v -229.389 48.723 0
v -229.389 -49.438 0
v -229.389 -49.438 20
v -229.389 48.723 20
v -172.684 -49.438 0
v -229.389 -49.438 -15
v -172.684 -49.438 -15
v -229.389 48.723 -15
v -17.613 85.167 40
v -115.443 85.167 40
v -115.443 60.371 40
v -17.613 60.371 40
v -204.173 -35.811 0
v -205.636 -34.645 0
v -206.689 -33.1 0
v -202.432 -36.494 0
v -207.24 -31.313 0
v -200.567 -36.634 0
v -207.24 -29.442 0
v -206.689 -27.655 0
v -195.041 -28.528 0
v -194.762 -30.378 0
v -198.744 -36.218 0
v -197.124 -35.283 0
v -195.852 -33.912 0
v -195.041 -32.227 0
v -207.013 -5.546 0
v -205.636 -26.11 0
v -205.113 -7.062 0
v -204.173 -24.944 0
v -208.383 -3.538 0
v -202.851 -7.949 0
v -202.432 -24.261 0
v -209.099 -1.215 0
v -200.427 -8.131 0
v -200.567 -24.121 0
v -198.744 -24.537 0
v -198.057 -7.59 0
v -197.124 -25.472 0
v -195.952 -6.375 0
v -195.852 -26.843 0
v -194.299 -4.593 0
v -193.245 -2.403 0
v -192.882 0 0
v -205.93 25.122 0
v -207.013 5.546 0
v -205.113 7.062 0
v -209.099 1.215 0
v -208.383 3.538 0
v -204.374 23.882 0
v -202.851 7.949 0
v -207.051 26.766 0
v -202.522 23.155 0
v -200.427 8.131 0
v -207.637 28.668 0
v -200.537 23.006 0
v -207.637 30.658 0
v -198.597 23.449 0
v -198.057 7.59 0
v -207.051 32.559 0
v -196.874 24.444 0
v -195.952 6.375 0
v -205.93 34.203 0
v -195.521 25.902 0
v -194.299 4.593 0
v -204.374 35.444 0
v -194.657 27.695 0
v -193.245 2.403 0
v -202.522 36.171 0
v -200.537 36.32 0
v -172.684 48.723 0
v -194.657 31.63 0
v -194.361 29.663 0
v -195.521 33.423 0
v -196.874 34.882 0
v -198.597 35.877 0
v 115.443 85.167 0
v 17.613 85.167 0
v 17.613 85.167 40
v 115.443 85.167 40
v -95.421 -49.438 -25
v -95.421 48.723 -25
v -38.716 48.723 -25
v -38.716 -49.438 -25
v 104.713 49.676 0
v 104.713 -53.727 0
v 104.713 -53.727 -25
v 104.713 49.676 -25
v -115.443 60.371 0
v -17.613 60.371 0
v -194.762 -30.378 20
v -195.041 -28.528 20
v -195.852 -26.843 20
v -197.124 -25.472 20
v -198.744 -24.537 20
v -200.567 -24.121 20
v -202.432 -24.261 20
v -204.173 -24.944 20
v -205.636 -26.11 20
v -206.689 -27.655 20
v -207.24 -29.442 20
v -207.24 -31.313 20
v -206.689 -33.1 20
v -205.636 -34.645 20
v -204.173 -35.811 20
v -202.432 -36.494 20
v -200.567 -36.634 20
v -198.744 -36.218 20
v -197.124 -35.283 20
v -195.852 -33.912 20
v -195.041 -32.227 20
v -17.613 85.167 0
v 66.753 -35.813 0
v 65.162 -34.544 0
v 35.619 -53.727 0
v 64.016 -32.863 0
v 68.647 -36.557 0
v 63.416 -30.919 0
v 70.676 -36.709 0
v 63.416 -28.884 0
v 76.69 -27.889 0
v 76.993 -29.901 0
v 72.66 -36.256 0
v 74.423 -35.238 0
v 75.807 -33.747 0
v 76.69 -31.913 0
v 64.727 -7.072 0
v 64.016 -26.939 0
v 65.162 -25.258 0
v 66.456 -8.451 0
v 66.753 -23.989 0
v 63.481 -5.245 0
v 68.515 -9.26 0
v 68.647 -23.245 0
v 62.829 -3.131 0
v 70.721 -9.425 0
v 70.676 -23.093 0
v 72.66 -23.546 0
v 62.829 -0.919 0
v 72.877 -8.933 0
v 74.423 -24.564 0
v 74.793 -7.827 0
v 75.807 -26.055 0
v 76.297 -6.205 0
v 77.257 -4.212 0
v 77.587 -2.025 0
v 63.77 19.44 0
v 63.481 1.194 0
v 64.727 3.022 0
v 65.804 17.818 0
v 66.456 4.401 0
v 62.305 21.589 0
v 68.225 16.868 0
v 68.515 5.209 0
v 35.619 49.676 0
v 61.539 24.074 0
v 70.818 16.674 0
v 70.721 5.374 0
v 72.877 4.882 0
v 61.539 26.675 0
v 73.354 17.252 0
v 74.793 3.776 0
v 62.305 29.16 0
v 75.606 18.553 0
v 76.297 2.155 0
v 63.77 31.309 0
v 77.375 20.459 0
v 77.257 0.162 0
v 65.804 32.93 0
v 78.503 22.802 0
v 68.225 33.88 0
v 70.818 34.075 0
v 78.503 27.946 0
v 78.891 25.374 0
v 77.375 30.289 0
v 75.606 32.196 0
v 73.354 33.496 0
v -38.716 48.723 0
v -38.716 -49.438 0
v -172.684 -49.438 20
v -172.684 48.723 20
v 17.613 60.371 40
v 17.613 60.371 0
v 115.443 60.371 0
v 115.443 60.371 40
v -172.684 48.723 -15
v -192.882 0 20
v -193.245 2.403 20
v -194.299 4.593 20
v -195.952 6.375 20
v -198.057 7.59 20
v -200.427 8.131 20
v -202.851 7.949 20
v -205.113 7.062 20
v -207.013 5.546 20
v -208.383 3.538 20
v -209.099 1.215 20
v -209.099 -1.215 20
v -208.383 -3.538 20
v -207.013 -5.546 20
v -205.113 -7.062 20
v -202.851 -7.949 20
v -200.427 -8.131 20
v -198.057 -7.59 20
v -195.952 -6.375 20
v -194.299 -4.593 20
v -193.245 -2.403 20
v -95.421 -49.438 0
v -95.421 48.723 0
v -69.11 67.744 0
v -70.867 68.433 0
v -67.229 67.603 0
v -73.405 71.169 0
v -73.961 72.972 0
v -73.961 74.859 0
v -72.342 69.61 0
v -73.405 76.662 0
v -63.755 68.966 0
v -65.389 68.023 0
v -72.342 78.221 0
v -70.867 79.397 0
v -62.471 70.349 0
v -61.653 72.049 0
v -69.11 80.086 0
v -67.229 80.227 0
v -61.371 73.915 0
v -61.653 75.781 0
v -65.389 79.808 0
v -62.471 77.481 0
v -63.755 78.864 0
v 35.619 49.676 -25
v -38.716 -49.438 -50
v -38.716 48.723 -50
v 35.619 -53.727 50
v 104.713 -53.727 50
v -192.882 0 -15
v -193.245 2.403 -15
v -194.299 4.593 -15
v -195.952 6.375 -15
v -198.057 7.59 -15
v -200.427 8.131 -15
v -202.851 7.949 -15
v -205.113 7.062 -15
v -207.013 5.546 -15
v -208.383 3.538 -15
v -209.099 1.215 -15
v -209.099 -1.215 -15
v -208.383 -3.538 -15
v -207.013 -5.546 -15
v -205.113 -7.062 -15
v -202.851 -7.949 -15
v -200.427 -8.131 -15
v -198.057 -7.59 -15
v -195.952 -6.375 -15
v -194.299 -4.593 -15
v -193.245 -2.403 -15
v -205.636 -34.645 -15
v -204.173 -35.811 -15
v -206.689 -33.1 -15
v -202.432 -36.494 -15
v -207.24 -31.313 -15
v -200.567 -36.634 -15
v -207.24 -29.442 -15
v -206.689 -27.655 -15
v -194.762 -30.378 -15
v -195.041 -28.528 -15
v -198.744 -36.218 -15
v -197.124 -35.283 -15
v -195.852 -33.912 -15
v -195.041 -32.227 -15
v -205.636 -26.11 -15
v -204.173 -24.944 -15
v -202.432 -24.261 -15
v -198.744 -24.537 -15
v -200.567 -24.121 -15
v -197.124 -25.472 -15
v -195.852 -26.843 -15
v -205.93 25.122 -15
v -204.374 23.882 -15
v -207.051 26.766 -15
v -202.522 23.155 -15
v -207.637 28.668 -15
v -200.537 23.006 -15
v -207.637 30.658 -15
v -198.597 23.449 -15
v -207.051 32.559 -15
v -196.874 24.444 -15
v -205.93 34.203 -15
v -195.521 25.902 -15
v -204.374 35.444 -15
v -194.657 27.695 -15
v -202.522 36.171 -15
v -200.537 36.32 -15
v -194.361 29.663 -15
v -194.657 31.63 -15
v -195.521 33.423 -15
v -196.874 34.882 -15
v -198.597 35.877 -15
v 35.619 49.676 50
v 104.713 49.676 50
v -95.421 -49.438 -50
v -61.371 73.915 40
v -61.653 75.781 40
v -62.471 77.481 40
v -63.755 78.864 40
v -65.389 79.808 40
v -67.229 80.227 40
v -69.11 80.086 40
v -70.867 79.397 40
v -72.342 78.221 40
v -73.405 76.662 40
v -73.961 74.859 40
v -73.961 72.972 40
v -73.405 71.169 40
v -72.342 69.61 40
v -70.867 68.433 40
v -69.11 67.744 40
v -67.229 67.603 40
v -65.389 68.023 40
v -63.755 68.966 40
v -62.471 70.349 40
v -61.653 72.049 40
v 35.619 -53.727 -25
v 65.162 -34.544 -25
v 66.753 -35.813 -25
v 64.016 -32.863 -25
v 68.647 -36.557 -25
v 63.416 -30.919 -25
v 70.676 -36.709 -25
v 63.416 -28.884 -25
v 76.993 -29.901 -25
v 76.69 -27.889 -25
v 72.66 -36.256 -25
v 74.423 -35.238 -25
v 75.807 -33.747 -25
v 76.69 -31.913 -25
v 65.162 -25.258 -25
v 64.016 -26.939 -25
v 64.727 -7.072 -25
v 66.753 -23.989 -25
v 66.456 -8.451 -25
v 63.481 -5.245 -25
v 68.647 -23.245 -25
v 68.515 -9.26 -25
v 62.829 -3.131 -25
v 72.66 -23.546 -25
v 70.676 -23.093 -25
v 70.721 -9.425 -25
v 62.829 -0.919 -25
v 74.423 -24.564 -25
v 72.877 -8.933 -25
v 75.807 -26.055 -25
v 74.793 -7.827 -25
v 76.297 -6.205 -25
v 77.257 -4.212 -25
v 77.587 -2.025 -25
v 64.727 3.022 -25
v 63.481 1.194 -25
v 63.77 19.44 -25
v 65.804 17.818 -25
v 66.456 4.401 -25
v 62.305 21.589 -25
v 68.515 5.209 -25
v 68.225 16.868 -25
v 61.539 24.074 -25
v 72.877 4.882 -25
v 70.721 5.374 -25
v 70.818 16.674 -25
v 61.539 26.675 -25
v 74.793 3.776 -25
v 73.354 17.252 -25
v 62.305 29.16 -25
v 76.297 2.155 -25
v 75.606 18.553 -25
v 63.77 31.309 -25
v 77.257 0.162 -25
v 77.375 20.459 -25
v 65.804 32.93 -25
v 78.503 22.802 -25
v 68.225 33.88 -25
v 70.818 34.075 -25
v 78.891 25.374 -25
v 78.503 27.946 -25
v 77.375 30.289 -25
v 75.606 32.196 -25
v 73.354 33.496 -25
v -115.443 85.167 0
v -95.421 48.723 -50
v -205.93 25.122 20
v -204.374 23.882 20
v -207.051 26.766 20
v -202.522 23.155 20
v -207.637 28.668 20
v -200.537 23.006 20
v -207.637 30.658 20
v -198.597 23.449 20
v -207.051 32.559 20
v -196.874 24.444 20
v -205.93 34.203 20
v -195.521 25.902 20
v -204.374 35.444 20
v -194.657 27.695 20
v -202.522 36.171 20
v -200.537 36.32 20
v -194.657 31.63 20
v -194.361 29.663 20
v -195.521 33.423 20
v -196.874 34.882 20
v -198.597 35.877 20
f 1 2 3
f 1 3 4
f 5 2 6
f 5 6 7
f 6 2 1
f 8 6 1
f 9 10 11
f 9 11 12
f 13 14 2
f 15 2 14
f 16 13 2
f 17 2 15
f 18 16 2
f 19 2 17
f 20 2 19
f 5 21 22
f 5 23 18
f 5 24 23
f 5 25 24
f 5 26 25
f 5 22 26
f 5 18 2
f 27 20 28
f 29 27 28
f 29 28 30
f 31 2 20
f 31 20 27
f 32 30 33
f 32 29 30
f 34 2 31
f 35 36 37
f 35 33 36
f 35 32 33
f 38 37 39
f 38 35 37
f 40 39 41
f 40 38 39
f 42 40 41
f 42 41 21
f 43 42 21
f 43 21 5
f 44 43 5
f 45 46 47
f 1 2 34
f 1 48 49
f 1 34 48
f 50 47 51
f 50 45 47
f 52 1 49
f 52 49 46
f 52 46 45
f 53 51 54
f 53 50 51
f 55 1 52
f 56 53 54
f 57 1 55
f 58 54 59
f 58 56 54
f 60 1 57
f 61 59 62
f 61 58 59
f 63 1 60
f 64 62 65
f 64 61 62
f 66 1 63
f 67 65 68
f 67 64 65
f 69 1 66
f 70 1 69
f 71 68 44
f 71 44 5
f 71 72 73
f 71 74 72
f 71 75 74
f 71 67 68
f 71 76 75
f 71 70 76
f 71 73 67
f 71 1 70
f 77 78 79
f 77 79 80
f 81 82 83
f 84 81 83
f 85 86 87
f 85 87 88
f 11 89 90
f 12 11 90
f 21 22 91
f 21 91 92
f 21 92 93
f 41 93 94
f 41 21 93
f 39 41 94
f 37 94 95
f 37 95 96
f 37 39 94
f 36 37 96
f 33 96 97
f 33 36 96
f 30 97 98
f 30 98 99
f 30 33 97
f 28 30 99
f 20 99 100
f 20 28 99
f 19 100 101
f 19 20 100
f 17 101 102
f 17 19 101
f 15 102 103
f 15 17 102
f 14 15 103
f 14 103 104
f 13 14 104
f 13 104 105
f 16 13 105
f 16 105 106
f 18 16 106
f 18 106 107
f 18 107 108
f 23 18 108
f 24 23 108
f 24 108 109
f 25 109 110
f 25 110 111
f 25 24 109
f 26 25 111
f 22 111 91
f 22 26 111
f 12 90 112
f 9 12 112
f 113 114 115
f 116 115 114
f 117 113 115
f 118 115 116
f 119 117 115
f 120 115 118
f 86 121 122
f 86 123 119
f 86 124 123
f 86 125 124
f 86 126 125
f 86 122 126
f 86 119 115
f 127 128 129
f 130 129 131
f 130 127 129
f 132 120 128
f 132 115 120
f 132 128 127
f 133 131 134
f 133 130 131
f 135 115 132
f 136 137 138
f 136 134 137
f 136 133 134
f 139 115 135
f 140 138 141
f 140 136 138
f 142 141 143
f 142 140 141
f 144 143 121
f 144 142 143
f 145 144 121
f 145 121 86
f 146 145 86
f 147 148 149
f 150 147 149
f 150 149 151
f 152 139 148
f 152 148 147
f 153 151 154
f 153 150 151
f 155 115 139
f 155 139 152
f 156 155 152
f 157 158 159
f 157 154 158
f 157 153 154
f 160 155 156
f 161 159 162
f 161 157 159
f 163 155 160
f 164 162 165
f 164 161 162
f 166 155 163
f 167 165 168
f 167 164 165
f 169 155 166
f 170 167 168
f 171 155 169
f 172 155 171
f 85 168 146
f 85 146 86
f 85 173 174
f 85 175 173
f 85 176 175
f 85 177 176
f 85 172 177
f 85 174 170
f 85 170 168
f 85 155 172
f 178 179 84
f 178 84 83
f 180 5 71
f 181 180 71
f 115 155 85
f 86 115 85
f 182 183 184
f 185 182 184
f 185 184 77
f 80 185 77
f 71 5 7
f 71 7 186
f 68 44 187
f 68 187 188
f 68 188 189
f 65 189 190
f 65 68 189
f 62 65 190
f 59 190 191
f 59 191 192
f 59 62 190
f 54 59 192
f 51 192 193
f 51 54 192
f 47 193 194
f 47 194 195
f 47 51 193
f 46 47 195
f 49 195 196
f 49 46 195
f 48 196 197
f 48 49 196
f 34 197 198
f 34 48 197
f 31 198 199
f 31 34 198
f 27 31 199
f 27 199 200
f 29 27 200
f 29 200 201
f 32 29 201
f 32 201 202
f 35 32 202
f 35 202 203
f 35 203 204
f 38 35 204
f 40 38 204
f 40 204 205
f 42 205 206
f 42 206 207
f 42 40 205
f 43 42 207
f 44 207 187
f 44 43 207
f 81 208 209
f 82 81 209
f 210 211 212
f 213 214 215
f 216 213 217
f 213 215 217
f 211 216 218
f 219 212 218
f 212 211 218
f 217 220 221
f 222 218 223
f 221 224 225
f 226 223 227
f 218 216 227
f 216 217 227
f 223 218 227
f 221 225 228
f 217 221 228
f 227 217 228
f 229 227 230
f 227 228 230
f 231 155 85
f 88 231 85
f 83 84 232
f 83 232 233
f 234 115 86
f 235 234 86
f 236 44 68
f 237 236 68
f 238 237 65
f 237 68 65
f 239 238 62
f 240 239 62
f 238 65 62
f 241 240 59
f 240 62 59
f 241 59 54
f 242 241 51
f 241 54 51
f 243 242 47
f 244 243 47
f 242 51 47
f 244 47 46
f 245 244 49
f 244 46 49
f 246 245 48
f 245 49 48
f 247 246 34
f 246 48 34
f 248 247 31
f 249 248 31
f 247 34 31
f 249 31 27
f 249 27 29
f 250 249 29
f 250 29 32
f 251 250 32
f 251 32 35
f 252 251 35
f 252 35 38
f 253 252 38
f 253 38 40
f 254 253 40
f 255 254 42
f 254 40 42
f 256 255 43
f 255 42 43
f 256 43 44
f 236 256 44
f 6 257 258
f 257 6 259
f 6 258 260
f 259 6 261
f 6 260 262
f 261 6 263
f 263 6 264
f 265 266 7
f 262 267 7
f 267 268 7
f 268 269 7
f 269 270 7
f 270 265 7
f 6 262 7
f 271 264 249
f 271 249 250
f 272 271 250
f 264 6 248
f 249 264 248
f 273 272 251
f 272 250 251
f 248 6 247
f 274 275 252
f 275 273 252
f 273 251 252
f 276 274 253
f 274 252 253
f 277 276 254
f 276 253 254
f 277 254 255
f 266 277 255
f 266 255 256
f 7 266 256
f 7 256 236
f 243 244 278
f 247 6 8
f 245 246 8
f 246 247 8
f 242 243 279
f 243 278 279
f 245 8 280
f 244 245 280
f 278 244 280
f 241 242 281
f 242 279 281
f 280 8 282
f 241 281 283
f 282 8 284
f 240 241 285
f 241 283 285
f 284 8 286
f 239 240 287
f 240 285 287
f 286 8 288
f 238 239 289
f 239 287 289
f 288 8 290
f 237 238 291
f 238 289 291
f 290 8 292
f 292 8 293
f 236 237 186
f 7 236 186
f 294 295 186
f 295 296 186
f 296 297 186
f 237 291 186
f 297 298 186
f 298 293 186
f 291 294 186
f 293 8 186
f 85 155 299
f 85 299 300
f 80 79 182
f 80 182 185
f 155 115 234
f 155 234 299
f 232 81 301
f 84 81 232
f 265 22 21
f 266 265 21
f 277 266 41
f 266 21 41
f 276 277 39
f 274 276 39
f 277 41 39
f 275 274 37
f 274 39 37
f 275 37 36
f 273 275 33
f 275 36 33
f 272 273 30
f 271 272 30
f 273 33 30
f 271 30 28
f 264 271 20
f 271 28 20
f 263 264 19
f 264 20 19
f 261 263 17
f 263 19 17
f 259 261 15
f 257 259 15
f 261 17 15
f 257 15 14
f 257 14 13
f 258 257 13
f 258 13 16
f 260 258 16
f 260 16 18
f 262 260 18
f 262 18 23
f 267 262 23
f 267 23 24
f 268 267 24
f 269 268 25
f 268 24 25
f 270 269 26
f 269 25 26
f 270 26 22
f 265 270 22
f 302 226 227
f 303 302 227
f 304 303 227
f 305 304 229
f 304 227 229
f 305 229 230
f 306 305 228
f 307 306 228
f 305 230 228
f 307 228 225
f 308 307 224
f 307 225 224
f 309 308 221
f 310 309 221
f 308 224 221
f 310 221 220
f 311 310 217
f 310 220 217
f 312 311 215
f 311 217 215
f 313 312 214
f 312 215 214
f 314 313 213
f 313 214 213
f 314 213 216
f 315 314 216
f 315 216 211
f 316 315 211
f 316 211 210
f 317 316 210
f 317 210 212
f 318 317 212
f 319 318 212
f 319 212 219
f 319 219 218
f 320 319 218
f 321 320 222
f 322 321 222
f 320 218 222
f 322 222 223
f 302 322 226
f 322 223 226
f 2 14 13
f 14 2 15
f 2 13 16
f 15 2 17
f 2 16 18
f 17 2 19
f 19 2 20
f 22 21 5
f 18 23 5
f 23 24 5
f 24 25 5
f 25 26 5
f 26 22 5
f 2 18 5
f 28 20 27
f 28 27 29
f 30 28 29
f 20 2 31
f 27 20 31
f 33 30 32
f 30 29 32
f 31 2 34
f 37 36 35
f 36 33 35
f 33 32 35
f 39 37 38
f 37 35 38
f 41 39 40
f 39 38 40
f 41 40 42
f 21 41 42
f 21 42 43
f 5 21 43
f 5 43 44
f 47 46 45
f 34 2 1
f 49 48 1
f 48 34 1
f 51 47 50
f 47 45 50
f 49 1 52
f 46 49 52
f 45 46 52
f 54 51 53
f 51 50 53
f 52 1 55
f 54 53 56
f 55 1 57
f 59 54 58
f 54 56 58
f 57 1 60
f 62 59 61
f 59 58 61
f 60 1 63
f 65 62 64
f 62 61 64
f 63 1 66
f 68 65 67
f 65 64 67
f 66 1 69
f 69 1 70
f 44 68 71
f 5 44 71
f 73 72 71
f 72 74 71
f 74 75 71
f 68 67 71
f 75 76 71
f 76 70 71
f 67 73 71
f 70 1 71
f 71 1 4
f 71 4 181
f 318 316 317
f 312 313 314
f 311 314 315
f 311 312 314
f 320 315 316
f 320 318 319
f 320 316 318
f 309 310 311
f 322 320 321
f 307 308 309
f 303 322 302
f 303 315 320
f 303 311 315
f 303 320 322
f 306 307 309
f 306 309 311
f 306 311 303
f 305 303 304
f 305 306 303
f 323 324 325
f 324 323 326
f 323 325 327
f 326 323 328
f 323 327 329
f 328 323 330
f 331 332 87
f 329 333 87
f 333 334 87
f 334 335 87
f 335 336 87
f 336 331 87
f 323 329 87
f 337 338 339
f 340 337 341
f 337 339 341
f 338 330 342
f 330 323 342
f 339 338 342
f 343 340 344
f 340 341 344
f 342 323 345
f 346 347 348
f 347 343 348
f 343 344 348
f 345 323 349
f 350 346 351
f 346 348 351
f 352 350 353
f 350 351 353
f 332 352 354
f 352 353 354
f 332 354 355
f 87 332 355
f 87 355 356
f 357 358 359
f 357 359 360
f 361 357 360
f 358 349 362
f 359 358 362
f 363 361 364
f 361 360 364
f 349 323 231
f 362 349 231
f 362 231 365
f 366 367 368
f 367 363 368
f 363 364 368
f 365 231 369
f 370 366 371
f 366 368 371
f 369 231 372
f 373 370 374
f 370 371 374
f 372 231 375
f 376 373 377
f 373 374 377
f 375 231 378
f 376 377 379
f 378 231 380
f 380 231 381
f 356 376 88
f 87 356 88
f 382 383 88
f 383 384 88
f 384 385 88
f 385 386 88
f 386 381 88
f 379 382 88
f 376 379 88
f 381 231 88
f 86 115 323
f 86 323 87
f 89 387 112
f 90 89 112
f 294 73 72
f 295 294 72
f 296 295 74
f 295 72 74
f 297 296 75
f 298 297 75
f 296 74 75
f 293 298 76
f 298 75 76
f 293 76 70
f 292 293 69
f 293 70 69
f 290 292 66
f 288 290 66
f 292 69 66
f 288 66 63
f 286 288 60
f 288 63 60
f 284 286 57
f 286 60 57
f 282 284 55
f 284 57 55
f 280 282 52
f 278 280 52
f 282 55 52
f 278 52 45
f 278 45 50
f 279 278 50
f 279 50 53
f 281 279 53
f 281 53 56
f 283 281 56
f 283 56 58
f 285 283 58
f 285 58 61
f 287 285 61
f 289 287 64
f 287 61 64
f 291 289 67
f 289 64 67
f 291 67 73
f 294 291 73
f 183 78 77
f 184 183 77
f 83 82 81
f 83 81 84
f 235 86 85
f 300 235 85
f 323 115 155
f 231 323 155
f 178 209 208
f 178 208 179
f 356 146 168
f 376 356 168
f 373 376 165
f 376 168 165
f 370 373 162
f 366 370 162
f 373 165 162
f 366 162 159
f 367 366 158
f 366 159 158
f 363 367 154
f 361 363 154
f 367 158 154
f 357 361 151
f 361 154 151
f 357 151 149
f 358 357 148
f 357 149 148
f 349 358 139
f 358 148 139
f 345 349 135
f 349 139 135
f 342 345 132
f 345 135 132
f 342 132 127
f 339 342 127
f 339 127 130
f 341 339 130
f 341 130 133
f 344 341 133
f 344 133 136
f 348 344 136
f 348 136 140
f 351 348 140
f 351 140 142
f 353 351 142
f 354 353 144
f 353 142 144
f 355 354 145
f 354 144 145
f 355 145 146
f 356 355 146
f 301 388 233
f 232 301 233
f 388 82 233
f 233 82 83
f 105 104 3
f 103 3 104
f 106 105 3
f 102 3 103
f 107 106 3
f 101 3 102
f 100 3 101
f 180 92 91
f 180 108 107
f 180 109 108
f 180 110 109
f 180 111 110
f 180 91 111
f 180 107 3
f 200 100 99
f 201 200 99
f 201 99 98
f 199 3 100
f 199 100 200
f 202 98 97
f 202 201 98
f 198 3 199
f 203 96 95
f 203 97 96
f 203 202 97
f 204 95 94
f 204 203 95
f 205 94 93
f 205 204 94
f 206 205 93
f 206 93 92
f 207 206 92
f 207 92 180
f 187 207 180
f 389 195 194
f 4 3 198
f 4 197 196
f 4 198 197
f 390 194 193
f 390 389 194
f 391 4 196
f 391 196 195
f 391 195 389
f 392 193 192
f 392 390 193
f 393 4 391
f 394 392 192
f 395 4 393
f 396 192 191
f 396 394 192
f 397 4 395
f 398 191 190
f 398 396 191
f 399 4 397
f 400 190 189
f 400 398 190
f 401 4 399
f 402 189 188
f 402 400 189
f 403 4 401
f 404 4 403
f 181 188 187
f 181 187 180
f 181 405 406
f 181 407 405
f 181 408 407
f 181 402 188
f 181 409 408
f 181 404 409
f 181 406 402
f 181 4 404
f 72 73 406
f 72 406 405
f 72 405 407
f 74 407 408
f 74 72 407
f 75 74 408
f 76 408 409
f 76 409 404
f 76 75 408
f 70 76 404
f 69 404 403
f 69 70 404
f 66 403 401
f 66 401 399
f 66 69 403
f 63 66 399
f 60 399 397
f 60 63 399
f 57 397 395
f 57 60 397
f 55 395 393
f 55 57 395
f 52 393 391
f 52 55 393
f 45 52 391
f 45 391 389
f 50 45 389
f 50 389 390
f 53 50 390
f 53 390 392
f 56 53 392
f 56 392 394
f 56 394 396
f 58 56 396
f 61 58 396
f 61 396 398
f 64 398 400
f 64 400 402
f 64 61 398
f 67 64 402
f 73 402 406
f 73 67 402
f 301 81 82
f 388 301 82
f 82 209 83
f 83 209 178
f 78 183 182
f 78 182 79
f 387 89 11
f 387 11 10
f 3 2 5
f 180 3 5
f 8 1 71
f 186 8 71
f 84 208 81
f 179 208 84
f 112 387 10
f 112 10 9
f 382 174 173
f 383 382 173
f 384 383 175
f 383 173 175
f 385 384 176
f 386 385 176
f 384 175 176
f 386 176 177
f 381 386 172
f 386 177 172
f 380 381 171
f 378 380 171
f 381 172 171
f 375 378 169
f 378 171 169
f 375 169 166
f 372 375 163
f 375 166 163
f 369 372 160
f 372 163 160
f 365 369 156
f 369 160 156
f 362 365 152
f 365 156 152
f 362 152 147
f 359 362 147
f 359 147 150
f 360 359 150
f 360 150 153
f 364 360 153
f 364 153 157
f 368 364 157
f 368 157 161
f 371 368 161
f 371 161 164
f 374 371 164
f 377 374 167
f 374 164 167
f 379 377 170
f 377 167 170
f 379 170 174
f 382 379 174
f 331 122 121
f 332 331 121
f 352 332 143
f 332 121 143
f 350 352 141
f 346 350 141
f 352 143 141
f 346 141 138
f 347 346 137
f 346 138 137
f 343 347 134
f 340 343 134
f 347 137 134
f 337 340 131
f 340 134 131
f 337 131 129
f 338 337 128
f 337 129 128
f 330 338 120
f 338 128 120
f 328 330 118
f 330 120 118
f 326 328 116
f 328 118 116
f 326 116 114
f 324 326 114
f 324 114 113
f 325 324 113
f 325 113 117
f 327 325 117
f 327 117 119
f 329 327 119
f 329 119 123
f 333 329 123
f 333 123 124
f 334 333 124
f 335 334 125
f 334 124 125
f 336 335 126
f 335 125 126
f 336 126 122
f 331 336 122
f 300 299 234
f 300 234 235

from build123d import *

# Parameters (mm, degrees)
F0_W     = 69.0940581262
F0_H     = 103.4028343856
F0_R     = 6.8267575368
F0_R_2   = 7.4204250621
F0_R_3   = 8.7248380927
F1_DEPTH = 50
F2_DEPTH = 25
F3_W     = 56.7047856748
F3_H     = 98.1612205505
F3_R     = 6.2741838457
F3_R_2   = 8.1539291884
F3_R_3   = 6.6754039926
F4_DEPTH = 25
F5_DEPTH = 25
F6_DEPTH = 15
F7_DEPTH = 20
F3_W_2   = 97.8302806616
F3_H_2   = 24.796500802
F8_DEPTH = 40
F0_R_4   = 6.3300792134
F9_DEPTH = 40


with BuildPart() as f1:
    # F0 (on Top) → F1 (new body)
    with BuildSketch(Plane.XY):
        with Locations((70.1662097126, -2.0251777023)):
            Rectangle(F0_W, F0_H)
        with Locations((70.1662097126, -29.9010574818)):
            Circle(F0_R, mode=Mode.SUBTRACT)
        with Locations((70.1662097126, -2.0251777023)):
            Circle(F0_R_2, mode=Mode.SUBTRACT)
        with Locations((70.1662097126, 25.3741908818)):
            Circle(F0_R_3, mode=Mode.SUBTRACT)
        with Locations((70.1662097126, 25.3741908818)):
            Circle(F0_R_3)
        with Locations((70.1662097126, -2.0251777023)):
            Circle(F0_R_2)
        with Locations((70.1662097126, -29.9010574818)):
            Circle(F0_R)
    extrude(amount=F1_DEPTH)


with BuildPart() as f2:
    # F0 (on Top) → F2 (new body)
    with BuildSketch(Plane.XY):
        with Locations((70.1662097126, -2.0251777023)):
            Rectangle(F0_W, F0_H)
        with Locations((70.1662097126, -29.9010574818)):
            Circle(F0_R, mode=Mode.SUBTRACT)
        with Locations((70.1662097126, -2.0251777023)):
            Circle(F0_R_2, mode=Mode.SUBTRACT)
        with Locations((70.1662097126, 25.3741908818)):
            Circle(F0_R_3, mode=Mode.SUBTRACT)
    extrude(amount=-F2_DEPTH)


with BuildPart() as f4:
    # F3 (on Top) → F4 (new body)
    with BuildSketch(Plane.XY):
        with Locations((-67.0688915998, -0.3573894501)):
            Rectangle(F3_W, F3_H)
        with Locations((-67.0688915998, -30.3775668144)):
            Circle(F3_R, mode=Mode.SUBTRACT)
        with Locations((-67.0688915998, 0)):
            Circle(F3_R_2, mode=Mode.SUBTRACT)
        with Locations((-67.0688915998, 29.6627879143)):
            Circle(F3_R_3, mode=Mode.SUBTRACT)
        with Locations((-67.0688915998, 0)):
            Circle(F3_R_2)
        with Locations((-67.0688915998, 29.6627879143)):
            Circle(F3_R_3)
        with Locations((-67.0688915998, -30.3775668144)):
            Circle(F3_R)
    extrude(amount=-F4_DEPTH)


with BuildPart() as f5:
    # F5 (new): a face of the model
    f5_faces = [f4.part.faces().sort_by_distance(p)[0] for p in [
        (-67.0688915998, -0.3573894501, -25),
    ]]
    extrude(f5_faces, amount=F5_DEPTH)


with BuildPart() as f6:
    # F3 (on Top) → F6 (new body)
    with BuildSketch(Plane.XY):
        with Locations((-201.0361980647, -0.3573894501)):
            Rectangle(F3_W, F3_H)
        with Locations((-201.0361980647, -30.3775668144)):
            Circle(F3_R, mode=Mode.SUBTRACT)
        with Locations((-201.0361980647, 0)):
            Circle(F3_R_2, mode=Mode.SUBTRACT)
        with Locations((-201.0361980647, 29.6627879143)):
            Circle(F3_R_3, mode=Mode.SUBTRACT)
    extrude(amount=-F6_DEPTH)


with BuildPart() as f7:
    # F3 (on Top) → F7 (new body)
    with BuildSketch(Plane.XY):
        with Locations((-201.0361980647, -0.3573894501)):
            Rectangle(F3_W, F3_H)
        with Locations((-201.0361980647, -30.3775668144)):
            Circle(F3_R, mode=Mode.SUBTRACT)
        with Locations((-201.0361980647, 0)):
            Circle(F3_R_2, mode=Mode.SUBTRACT)
        with Locations((-201.0361980647, 29.6627879143)):
            Circle(F3_R_3, mode=Mode.SUBTRACT)
    extrude(amount=F7_DEPTH)


with BuildPart() as f8:
    # F3 (on Top) → F8 (new body)
    with BuildSketch(Plane.XY):
        with Locations((-66.5278732777, 72.7688670158)):
            Rectangle(F3_W_2, F3_H_2)
    extrude(amount=F8_DEPTH)


with BuildPart() as f8b:
    # F0 (on Top) → F8, piece 2 (new body)
    with BuildSketch(Plane.XY):
        with Locations((-67.7015483379, 73.9150568843)):
            Circle(F0_R_4)
    extrude(amount=F8_DEPTH)


with BuildPart() as f9:
    # F3 (on Top) → F9 (new body)
    with BuildSketch(Plane.XY):
        with Locations((66.5278732777, 72.7688670158)):
            Rectangle(F3_W_2, F3_H_2)
    extrude(amount=F9_DEPTH)


solid = Compound([f1.part, f2.part, f4.part, f5.part, f6.part, f7.part, f8.part, f8b.part, f9.part])
